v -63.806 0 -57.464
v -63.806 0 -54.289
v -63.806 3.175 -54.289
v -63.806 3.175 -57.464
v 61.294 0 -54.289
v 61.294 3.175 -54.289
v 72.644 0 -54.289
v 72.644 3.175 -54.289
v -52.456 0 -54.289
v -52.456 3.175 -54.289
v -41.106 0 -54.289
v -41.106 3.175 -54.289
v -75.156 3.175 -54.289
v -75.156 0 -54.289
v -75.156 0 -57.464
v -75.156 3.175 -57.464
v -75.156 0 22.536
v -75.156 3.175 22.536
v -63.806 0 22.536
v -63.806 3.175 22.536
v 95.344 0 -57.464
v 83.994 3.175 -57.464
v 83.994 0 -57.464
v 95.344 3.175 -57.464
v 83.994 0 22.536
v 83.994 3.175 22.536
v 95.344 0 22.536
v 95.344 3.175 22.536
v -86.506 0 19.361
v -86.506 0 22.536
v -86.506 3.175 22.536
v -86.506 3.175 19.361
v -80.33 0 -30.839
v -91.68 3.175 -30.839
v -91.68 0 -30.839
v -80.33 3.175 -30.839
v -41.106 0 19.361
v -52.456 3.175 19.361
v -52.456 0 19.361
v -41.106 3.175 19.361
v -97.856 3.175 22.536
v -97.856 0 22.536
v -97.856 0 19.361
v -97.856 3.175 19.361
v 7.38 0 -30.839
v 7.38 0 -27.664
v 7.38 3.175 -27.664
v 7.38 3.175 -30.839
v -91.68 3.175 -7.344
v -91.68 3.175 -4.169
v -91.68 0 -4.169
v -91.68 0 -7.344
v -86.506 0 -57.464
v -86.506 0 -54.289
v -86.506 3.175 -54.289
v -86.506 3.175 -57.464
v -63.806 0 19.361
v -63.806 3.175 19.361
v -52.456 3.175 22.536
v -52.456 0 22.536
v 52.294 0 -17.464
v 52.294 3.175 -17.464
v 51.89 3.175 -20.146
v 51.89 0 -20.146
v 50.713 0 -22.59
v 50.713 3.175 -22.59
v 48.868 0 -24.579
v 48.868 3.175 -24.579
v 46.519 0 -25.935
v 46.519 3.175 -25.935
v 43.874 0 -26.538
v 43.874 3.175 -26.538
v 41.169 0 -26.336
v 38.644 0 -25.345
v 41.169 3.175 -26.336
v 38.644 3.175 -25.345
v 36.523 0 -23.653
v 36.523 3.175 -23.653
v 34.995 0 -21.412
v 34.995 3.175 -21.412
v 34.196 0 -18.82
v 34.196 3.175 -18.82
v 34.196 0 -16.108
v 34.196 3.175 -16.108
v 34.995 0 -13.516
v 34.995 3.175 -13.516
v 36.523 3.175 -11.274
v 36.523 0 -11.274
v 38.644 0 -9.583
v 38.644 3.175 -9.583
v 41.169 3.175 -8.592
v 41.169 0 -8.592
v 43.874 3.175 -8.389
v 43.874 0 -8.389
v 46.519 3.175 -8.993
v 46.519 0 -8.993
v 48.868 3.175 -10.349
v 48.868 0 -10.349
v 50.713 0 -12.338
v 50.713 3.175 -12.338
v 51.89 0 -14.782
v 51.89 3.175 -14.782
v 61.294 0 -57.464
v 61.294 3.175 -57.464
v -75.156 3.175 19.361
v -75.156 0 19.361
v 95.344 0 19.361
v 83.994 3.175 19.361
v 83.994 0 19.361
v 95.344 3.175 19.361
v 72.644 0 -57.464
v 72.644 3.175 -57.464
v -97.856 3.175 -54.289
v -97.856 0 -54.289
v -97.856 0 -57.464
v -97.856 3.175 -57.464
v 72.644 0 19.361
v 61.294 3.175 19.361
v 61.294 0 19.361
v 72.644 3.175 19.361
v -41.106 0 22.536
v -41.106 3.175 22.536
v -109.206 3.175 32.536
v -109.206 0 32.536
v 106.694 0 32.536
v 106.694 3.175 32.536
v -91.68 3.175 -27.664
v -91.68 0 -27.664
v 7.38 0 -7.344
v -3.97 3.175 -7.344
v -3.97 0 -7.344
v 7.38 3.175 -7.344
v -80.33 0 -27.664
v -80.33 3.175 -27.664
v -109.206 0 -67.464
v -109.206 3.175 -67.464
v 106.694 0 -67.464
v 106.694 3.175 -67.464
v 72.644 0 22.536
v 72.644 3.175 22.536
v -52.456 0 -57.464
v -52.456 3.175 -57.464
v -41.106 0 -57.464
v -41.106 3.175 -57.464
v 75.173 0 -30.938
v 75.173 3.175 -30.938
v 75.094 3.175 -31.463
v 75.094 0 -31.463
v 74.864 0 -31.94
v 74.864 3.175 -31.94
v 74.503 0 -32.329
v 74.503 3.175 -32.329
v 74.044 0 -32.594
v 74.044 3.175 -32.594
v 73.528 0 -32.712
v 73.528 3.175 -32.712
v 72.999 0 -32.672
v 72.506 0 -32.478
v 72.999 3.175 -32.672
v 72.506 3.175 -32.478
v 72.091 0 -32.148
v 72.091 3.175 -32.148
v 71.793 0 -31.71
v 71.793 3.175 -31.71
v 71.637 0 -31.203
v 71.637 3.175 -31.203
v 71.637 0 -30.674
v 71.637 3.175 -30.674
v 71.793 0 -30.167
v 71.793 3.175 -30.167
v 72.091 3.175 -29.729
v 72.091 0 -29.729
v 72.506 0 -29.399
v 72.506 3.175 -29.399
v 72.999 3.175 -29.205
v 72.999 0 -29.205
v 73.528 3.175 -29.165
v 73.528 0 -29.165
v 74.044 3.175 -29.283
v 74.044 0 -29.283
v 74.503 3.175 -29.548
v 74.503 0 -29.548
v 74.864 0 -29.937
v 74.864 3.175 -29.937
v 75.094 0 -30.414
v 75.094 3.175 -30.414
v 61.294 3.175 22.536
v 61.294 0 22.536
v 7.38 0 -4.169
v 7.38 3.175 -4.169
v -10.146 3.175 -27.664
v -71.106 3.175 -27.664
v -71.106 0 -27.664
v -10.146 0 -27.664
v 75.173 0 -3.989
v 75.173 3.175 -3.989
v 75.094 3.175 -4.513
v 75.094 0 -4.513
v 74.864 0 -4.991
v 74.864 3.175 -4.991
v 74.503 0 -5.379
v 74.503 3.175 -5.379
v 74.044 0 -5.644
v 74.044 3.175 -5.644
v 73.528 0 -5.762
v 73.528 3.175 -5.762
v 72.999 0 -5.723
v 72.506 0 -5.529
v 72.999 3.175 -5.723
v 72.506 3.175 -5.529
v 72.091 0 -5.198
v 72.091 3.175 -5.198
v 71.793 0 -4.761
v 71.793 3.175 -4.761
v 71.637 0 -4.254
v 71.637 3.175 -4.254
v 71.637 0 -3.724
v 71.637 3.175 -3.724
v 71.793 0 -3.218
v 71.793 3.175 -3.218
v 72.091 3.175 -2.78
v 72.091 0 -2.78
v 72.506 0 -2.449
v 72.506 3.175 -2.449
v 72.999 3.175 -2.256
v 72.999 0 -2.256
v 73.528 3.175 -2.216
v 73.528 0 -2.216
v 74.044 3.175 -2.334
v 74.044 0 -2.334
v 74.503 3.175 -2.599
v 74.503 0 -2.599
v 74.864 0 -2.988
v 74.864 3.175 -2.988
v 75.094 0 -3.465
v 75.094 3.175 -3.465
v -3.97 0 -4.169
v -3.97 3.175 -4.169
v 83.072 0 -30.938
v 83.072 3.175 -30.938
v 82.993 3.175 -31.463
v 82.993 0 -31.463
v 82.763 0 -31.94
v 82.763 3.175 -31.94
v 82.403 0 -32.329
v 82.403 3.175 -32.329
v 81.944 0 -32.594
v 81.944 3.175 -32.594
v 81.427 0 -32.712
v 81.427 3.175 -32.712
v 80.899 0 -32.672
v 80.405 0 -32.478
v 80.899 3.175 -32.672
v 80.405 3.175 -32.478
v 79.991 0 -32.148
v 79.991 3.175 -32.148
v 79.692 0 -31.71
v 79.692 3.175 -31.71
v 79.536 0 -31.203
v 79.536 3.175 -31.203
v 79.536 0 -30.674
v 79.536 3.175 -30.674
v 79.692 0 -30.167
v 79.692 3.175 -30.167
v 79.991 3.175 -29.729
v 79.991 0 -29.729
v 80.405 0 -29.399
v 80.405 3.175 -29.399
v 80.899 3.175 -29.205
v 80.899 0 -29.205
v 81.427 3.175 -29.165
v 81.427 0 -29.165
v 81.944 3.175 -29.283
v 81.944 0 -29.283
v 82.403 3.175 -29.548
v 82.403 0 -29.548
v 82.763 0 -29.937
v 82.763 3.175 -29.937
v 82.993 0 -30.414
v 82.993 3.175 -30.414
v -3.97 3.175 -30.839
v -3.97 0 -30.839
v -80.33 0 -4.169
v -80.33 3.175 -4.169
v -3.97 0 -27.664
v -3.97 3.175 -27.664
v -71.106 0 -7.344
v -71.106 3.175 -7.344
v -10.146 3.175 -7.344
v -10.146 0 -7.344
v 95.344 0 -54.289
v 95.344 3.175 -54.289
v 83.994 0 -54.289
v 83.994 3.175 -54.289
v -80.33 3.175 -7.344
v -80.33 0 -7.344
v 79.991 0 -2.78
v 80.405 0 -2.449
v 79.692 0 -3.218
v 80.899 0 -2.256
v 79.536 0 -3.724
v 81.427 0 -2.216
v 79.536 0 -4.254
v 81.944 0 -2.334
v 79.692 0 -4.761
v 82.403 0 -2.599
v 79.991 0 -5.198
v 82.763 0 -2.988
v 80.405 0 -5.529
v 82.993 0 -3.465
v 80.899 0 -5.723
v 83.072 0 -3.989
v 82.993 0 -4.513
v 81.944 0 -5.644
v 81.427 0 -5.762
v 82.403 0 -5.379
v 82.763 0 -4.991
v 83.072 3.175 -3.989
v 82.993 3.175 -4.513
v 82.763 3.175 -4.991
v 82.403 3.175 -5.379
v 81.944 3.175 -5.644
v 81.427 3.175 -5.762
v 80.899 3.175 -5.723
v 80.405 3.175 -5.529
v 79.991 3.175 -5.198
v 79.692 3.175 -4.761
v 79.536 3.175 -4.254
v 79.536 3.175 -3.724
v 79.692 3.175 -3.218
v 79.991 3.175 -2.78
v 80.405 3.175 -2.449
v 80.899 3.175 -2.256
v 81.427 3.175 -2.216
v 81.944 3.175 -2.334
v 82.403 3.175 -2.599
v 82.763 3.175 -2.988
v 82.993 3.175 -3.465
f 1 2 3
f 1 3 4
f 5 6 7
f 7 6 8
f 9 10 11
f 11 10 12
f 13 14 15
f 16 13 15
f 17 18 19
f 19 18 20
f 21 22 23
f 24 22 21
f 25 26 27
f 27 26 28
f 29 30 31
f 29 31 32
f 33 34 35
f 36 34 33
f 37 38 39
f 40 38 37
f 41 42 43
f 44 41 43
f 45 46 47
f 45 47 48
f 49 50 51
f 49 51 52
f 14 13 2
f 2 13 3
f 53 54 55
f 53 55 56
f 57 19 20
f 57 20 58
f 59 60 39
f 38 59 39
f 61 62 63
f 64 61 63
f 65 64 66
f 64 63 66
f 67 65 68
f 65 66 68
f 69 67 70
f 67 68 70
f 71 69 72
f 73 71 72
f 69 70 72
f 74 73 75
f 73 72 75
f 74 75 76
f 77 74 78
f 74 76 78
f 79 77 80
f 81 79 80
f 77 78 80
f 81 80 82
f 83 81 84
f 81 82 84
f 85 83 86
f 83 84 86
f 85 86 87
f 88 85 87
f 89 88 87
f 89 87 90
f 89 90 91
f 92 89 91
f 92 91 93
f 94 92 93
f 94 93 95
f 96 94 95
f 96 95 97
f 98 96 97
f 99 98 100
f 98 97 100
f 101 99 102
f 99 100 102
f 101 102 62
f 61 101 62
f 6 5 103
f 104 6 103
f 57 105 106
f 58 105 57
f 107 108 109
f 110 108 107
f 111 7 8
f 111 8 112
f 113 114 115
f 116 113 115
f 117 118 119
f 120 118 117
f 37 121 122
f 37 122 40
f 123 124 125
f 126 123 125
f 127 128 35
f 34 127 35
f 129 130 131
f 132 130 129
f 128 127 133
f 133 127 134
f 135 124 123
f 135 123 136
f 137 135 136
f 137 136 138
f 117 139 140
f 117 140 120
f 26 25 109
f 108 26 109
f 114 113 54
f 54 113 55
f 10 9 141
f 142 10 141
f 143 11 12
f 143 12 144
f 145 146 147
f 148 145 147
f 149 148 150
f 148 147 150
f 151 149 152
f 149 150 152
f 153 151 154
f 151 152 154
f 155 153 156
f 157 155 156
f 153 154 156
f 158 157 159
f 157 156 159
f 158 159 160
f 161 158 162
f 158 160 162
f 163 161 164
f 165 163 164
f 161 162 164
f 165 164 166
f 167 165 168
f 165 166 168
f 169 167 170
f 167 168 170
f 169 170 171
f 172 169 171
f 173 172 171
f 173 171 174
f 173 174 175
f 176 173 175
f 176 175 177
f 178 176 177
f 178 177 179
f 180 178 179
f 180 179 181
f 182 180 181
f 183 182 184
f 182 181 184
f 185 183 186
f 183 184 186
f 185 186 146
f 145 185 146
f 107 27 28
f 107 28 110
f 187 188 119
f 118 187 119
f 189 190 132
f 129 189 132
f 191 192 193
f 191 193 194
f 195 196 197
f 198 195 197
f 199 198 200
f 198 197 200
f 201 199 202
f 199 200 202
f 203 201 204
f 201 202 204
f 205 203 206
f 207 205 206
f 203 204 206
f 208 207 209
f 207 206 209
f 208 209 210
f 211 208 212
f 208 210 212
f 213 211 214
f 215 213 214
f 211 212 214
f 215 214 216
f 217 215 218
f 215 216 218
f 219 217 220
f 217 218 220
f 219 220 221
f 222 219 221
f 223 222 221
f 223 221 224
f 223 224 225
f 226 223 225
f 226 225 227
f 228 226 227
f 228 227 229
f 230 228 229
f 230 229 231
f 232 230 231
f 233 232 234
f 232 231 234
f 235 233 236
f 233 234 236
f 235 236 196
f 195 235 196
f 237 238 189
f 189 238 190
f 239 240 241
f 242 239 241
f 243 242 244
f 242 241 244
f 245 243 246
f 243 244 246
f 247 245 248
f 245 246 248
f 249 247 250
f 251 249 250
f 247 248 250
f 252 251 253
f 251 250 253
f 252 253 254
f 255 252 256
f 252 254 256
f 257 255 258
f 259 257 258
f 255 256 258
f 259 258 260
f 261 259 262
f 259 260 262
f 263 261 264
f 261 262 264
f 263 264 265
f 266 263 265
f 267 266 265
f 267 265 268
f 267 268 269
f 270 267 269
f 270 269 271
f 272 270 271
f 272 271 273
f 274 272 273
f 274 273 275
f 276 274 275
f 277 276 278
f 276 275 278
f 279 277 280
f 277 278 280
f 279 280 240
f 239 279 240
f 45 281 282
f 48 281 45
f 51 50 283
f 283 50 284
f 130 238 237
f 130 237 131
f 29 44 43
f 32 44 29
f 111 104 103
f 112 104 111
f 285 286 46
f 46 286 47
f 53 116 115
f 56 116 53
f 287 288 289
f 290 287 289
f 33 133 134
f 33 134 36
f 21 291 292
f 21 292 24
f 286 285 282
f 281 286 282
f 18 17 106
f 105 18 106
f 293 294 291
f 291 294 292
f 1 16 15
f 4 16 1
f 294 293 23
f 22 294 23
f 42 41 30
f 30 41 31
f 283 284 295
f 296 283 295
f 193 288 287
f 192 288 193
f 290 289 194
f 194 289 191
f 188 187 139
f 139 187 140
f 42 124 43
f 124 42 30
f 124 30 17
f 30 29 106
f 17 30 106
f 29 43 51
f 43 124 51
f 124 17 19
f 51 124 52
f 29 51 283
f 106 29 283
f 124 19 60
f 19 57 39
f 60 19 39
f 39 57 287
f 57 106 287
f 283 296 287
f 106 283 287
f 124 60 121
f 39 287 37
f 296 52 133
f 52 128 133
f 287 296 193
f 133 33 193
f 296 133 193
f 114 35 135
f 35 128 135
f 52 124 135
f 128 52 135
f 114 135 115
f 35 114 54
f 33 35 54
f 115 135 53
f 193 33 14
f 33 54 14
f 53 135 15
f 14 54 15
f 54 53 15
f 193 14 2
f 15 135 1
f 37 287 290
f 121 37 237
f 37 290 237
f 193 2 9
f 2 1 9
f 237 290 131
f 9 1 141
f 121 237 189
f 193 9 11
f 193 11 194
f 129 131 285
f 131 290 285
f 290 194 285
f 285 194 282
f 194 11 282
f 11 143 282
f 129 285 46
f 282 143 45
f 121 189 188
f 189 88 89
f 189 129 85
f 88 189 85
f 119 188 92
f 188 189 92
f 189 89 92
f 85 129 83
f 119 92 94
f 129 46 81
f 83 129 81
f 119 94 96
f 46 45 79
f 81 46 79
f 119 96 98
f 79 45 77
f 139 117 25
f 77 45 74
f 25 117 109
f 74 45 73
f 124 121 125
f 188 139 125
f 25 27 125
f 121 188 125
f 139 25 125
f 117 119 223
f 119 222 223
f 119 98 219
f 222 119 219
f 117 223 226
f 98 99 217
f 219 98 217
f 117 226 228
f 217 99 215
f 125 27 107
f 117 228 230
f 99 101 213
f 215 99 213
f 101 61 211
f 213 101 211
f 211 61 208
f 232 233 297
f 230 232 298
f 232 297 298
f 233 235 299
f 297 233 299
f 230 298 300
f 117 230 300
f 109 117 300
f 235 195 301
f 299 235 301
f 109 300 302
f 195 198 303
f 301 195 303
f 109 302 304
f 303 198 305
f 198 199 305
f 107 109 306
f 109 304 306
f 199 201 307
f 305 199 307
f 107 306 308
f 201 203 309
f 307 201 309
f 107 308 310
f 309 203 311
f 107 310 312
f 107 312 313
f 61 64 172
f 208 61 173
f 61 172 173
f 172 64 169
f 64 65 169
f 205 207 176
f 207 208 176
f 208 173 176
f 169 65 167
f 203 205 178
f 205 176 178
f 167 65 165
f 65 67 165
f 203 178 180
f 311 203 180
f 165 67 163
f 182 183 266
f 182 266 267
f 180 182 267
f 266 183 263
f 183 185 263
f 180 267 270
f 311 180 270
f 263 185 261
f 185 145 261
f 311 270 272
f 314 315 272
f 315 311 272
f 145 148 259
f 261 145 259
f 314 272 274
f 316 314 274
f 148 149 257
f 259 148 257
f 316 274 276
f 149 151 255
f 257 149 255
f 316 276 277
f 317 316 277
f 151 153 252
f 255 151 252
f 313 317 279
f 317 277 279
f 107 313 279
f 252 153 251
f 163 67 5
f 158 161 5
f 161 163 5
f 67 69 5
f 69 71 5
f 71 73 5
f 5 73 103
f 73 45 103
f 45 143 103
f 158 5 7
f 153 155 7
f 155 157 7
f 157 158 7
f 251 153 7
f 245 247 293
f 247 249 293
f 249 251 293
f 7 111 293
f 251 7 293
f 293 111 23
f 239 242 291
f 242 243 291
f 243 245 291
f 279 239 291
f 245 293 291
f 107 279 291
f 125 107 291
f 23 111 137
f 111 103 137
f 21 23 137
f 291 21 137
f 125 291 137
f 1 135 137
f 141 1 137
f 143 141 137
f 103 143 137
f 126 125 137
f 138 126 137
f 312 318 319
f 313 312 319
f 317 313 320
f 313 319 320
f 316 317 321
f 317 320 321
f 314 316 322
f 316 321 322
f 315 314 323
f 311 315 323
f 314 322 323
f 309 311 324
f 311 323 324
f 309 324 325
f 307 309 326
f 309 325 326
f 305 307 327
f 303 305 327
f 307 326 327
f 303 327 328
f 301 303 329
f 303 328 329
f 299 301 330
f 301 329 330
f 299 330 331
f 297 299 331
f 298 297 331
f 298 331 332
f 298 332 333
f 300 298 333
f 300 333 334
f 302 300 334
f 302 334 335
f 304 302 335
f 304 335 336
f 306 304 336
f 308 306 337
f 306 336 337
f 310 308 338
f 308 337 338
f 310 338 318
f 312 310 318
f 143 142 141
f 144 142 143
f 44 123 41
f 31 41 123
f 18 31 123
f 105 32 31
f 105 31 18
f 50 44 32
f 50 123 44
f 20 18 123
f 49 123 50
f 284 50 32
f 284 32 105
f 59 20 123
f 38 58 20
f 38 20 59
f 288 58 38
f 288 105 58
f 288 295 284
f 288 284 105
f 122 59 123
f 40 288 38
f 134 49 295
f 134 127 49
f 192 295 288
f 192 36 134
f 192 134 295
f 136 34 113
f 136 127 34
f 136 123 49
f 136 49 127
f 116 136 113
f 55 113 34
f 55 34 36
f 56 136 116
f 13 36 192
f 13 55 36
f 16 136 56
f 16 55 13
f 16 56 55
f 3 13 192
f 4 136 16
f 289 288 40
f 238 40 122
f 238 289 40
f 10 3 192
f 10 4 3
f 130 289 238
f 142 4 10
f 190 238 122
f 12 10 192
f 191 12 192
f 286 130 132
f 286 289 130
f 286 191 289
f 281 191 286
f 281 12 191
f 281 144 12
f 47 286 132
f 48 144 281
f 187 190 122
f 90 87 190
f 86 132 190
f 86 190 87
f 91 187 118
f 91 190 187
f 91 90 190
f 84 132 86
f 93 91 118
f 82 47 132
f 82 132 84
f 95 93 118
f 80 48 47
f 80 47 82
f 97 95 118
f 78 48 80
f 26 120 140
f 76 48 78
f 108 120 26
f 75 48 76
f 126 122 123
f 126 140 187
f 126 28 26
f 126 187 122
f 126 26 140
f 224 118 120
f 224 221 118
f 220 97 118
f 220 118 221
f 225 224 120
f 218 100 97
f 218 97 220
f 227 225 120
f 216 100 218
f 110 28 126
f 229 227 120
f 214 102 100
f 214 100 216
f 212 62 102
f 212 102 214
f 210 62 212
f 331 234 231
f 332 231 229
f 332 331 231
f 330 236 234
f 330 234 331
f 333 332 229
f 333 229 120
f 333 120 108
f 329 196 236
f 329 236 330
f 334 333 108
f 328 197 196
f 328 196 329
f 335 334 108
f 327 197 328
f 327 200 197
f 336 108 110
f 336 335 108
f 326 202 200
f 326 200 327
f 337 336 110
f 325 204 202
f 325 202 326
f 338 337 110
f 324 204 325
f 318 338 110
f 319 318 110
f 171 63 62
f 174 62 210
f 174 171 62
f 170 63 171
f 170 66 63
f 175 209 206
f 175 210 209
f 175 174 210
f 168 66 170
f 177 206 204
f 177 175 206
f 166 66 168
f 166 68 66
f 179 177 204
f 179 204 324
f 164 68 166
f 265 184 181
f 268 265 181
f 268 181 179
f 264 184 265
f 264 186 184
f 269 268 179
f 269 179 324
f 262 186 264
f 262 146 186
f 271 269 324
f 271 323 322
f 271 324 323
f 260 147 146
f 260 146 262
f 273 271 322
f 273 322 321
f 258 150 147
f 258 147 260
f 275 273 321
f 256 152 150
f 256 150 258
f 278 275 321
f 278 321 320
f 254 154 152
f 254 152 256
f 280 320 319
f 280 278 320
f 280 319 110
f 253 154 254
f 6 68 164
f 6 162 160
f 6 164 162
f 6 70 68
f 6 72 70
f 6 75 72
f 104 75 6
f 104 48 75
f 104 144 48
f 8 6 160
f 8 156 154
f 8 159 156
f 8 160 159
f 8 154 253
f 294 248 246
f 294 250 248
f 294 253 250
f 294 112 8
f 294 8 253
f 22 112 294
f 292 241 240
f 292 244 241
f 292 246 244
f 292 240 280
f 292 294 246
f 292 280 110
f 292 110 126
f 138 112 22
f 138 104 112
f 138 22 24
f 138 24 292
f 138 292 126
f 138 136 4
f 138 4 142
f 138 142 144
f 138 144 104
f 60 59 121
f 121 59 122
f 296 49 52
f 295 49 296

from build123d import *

# Parameters (mm, degrees)
SKETCH1_W               = 215.9
SKETCH1_H               = 100
BOSS_EXTRUDE1_DEPTH     = 3.175
SKETCH3_W               = 11.35
SKETCH3_H               = 3.175
CUT_EXTRUDE2_DEPTH      = 3.175
SKETCH4_W               = 11.35
SKETCH4_H               = 3.175
CUT_EXTRUDE3_DEPTH      = 3.175
SKETCH5_W               = 60.96
SKETCH5_H               = 20.32
CUT_EXTRUDE4_DEPTH      = 1
CUT_EXTRUDE4_DEPTH_BACK = 3.175
SKETCH7_R               = 9.1
CUT_EXTRUDE6_DEPTH      = 3.175
SKETCH8_R               = 1.778
CUT_EXTRUDE7_DEPTH      = 3.175
SKETCH9_W               = 11.35
SKETCH9_H               = 3.175
CUT_EXTRUDE8_DEPTH      = 3.175


with BuildPart() as part:
    # Sketch1 → Boss-Extrude1 (new body)
    with BuildSketch(Plane(origin=(0, 0, 0), x_dir=(1, 0, 0), z_dir=(0, 1, 0))):
        with Locations((-1.255776173, 17.463898917)):
            Rectangle(SKETCH1_W, SKETCH1_H)
    extrude(amount=BOSS_EXTRUDE1_DEPTH)

    # Sketch3 → Cut-Extrude2 (cut)
    with BuildSketch(Plane(origin=(0, 3.175, 0), x_dir=(1, 0, 0), z_dir=(0, 1, 0))):
        with Locations((-92.180776173, 55.876398917)):
            Rectangle(SKETCH3_W, SKETCH3_H)
        with Locations((-46.780776173, 55.876398917)):
            Rectangle(SKETCH3_W, SKETCH3_H)
        with Locations((-69.480776173, 55.876398917)):
            Rectangle(SKETCH3_W, SKETCH3_H)
        with Locations((66.969233827, 55.876398917)):
            Rectangle(SKETCH3_W, SKETCH3_H)
        with Locations((89.669223827, 55.876398917)):
            Rectangle(SKETCH3_W, SKETCH3_H)
    extrude(amount=-CUT_EXTRUDE2_DEPTH, mode=Mode.SUBTRACT)

    # Sketch4 → Cut-Extrude3 (cut)
    with BuildSketch(Plane(origin=(0, 3.175, 0), x_dir=(1, 0, 0), z_dir=(0, 1, 0))):
        with Locations((-92.180776173, -20.948601083)):
            Rectangle(SKETCH4_W, SKETCH4_H)
        with Locations((-69.480776173, -20.948601083)):
            Rectangle(SKETCH4_W, SKETCH4_H)
        with Locations((-46.780776173, -20.948601083)):
            Rectangle(SKETCH4_W, SKETCH4_H)
        with Locations((66.969233827, -20.948601083)):
            Rectangle(SKETCH4_W, SKETCH4_H)
        with Locations((89.669223827, -20.948601083)):
            Rectangle(SKETCH4_W, SKETCH4_H)
    extrude(amount=-CUT_EXTRUDE3_DEPTH, mode=Mode.SUBTRACT)

    # Sketch5 → Cut-Extrude4 (cut, two sides)
    with BuildSketch(Plane(origin=(0, 3.175, 0), x_dir=(1, 0, 0), z_dir=(0, 1, 0))) as cut_extrude4_sk:
        with Locations((-40.625776173, 17.503898917)):
            Rectangle(SKETCH5_W, SKETCH5_H)
    extrude(amount=CUT_EXTRUDE4_DEPTH, mode=Mode.SUBTRACT)
    extrude(cut_extrude4_sk.sketch, amount=-CUT_EXTRUDE4_DEPTH_BACK, mode=Mode.SUBTRACT)

    # Sketch7 → Cut-Extrude6 (cut)
    with BuildSketch(Plane(origin=(0, 3.175, 0), x_dir=(1, 0, 0), z_dir=(0, 1, 0))):
        with Locations((43.194223827, 17.463898917)):
            Circle(SKETCH7_R)
    extrude(amount=-CUT_EXTRUDE6_DEPTH, mode=Mode.SUBTRACT)

    # Sketch8 → Cut-Extrude7 (cut)
    with BuildSketch(Plane(origin=(0, 3.175, 0), x_dir=(1, 0, 0), z_dir=(0, 1, 0))):
        with Locations((73.394823827, 30.938498917)):
            Circle(SKETCH8_R)
        with Locations((81.294223827, 3.989098917)):
            Circle(SKETCH8_R)
        with Locations((73.394823827, 3.989098917)):
            Circle(SKETCH8_R)
        with Locations((81.294223827, 30.938498917)):
            Circle(SKETCH8_R)
    extrude(amount=-CUT_EXTRUDE7_DEPTH, mode=Mode.SUBTRACT)

    # Sketch9 → Cut-Extrude8 (cut)
    with BuildSketch(Plane(origin=(0, 3.175, 0), x_dir=(1, 0, 0), z_dir=(0, 1, 0))):
        with Locations((-86.004776173, 5.756398917)):
            Rectangle(SKETCH9_W, SKETCH9_H)
        with Locations((-86.004776173, 29.251398917)):
            Rectangle(SKETCH9_W, SKETCH9_H)
        with Locations((1.705223827, 5.756398917)):
            Rectangle(SKETCH9_W, SKETCH9_H)
        with Locations((1.705223827, 29.251398917)):
            Rectangle(SKETCH9_W, SKETCH9_H)
    extrude(amount=-CUT_EXTRUDE8_DEPTH, mode=Mode.SUBTRACT)


solid = part.part
